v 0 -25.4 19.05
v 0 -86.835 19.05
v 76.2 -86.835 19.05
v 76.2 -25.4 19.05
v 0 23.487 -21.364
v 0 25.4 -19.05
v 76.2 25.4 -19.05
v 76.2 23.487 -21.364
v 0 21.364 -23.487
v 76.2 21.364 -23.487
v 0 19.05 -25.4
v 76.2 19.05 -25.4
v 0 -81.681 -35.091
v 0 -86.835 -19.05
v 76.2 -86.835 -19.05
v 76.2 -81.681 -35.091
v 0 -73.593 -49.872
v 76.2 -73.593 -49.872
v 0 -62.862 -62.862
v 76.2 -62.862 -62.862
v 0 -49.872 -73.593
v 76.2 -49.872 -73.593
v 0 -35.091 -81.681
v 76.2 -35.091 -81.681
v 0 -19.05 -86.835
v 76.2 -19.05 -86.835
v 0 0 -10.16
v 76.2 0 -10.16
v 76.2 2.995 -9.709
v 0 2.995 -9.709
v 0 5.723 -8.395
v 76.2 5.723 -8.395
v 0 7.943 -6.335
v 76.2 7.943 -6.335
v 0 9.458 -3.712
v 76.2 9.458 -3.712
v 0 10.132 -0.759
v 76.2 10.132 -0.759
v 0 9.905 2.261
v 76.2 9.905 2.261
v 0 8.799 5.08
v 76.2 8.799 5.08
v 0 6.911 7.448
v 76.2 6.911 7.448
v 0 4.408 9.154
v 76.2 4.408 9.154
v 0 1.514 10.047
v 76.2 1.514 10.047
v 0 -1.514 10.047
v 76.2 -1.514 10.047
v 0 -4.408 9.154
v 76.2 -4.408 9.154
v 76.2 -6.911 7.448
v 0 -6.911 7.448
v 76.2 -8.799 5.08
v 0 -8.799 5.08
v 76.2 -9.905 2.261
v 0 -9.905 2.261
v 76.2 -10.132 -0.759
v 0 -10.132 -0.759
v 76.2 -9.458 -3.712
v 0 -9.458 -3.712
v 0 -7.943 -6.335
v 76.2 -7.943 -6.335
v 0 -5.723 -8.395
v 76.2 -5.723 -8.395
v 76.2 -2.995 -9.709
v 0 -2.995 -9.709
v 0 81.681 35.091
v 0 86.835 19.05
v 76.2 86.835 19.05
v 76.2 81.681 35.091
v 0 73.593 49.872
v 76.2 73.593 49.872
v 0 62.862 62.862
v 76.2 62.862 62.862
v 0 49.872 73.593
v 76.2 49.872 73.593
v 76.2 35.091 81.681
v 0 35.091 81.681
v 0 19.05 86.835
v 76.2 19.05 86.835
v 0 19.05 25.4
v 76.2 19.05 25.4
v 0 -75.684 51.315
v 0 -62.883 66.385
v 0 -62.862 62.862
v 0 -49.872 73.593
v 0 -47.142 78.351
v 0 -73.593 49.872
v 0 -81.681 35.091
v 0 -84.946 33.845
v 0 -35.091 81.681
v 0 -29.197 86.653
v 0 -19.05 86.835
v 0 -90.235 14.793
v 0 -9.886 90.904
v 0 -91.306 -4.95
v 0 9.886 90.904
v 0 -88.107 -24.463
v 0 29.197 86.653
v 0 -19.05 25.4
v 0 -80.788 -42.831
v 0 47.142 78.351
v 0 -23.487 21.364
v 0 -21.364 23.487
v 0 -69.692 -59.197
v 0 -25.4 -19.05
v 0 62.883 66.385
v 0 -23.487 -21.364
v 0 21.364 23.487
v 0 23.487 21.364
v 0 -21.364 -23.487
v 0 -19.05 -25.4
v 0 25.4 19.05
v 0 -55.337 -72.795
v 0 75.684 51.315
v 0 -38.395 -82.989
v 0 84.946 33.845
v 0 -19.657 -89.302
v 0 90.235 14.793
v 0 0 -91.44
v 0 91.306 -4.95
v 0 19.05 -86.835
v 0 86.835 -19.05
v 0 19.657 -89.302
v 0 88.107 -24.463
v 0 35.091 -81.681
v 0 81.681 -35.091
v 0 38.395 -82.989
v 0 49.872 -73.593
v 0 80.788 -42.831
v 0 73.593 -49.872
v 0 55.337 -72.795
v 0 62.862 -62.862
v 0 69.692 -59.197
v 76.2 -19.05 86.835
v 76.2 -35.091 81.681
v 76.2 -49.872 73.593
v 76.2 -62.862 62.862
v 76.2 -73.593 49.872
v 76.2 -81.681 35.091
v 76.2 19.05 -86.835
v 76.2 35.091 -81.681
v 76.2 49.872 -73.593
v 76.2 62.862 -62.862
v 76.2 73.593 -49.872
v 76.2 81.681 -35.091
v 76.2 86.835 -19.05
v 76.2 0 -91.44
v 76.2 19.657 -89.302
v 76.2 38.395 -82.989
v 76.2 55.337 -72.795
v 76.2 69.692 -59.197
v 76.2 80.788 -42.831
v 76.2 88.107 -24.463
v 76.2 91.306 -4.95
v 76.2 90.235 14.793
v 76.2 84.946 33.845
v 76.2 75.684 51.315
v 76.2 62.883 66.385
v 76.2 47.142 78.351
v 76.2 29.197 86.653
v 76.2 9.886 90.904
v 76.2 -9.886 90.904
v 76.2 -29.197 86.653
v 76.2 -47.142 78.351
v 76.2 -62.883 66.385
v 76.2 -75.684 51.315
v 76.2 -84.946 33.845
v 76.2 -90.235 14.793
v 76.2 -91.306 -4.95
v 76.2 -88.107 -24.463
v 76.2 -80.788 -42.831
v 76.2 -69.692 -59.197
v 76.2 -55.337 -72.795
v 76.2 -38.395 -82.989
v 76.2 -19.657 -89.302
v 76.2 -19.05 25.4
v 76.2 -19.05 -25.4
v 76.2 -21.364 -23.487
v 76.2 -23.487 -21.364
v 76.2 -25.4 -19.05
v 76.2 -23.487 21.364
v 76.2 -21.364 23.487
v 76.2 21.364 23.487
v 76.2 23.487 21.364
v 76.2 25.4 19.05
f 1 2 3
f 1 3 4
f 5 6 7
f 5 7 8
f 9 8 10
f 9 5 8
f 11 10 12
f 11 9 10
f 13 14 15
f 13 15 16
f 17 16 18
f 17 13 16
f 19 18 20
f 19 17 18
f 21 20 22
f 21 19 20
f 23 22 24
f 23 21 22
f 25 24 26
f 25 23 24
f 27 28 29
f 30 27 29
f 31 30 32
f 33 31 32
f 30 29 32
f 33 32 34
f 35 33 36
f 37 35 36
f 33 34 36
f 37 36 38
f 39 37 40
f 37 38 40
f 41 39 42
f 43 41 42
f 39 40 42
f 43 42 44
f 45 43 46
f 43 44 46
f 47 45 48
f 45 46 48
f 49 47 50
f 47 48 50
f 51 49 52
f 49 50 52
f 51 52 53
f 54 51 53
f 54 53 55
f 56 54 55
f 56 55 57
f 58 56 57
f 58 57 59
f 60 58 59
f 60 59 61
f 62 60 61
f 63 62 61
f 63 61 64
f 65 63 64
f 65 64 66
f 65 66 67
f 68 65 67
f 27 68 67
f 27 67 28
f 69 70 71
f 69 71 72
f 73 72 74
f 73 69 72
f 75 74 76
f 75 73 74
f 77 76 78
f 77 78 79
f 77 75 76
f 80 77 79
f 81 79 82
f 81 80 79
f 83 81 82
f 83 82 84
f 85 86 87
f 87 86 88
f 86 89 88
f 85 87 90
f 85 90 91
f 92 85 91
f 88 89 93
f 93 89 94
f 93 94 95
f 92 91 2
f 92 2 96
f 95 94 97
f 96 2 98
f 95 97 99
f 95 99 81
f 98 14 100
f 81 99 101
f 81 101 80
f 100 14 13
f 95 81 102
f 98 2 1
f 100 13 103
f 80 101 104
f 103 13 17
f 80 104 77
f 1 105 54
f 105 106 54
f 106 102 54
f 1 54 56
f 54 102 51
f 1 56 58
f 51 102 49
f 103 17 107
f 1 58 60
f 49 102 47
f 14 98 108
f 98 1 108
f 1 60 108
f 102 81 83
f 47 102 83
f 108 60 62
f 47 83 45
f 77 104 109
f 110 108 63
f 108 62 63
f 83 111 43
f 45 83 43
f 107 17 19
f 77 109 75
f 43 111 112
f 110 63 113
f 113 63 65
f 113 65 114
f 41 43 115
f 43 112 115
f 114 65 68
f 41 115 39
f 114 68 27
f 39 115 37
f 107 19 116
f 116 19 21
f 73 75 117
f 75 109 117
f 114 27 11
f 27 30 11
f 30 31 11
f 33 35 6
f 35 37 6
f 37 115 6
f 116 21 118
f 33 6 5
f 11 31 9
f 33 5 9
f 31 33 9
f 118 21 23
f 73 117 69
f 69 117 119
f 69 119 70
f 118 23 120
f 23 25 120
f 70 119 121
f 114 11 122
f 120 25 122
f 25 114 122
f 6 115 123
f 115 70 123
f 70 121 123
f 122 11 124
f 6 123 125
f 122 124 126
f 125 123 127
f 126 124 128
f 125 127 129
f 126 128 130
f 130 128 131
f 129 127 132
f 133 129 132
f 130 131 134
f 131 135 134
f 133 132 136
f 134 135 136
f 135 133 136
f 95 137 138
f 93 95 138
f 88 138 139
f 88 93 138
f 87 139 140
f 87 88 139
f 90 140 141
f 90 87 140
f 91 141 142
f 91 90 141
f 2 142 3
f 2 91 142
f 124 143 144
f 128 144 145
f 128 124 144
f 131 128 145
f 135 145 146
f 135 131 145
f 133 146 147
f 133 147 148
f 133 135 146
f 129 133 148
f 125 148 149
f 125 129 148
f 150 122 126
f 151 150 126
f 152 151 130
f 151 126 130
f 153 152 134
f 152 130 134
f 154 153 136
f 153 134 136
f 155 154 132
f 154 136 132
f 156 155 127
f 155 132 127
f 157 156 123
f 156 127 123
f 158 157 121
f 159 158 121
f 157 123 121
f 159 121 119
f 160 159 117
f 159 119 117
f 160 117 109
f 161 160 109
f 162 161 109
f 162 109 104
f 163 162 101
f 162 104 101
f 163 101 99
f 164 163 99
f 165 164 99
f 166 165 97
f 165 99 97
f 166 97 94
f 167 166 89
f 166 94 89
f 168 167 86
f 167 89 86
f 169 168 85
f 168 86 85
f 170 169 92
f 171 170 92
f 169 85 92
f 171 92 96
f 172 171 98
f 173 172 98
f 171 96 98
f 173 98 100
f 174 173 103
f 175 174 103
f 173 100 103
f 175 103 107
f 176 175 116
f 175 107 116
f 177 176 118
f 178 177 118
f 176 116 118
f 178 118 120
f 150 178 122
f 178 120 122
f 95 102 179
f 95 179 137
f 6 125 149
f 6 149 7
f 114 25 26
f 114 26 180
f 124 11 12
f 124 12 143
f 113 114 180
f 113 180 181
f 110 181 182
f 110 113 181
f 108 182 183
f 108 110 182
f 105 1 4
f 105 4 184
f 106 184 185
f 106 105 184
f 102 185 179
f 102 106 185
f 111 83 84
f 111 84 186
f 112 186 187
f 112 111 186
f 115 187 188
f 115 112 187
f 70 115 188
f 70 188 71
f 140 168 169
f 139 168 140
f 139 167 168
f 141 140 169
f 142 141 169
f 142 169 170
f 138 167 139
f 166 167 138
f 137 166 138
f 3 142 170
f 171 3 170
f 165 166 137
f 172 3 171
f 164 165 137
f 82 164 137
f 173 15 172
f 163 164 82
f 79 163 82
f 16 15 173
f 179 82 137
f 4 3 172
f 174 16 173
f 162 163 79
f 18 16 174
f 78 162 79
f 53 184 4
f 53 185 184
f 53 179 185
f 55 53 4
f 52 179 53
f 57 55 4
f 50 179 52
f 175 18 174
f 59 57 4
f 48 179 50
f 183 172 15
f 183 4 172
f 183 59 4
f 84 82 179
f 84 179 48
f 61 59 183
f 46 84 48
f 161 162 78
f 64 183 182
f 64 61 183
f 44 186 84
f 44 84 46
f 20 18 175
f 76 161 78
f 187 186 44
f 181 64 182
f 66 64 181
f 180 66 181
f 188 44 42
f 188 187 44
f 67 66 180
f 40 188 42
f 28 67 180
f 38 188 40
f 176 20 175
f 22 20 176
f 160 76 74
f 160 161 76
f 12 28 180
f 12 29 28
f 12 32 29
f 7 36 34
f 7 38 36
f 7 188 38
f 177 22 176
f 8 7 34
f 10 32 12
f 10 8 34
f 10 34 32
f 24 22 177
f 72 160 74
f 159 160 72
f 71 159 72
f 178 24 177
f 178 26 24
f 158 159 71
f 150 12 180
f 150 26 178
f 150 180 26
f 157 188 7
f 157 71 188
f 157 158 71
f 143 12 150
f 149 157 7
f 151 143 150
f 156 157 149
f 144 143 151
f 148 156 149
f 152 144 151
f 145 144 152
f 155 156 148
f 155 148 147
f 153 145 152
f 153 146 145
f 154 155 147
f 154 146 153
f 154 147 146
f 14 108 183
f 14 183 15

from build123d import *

# Parameters (mm, degrees)
BOSS_EXTRUDE1_DEPTH = 76.2
BOSS_EXTRUDE2_START = -76.2
SKETCH2_R           = 91.44
SKETCH2_R_2         = 88.9
BOSS_EXTRUDE2_DEPTH = 76.2
SKETCH3_R           = 10.16
CUT_EXTRUDE1_DEPTH  = 88.9


with BuildPart() as part:
    # Sketch1 → Boss-Extrude1 (new body)
    with BuildSketch(Plane(origin=(0, 0, 0), x_dir=(0, 0, -1), z_dir=(1, 0, 0))):
        with BuildLine():
            Line((-86.834944003, 19.05), (-25.4, 19.05))
            ThreePointArc((-25.4, 19.05), (-22.450640303, 22.450640303), (-19.05, 25.4))
            Line((-19.05, 25.4), (-19.05, 86.834944003))
            ThreePointArc((-19.05, 86.834944003), (0, 88.9), (19.05, 86.834944003))
            Line((19.05, 86.834944003), (19.05, 25.4))
            ThreePointArc((19.05, 25.4), (22.450640303, 22.450640303), (25.4, 19.05))
            Line((25.4, 19.05), (86.834944003, 19.05))
            ThreePointArc((86.834944003, 19.05), (88.9, 0), (86.834944003, -19.05))
            Line((86.834944003, -19.05), (25.4, -19.05))
            ThreePointArc((25.4, -19.05), (22.450640303, -22.450640303), (19.05, -25.4))
            Line((19.05, -25.4), (19.05, -86.834944003))
            ThreePointArc((19.05, -86.834944003), (0, -88.9), (-19.05, -86.834944003))
            Line((-19.05, -86.834944003), (-19.05, -25.4))
            ThreePointArc((-19.05, -25.4), (-22.450640303, -22.450640303), (-25.4, -19.05))
            Line((-25.4, -19.05), (-86.834944003, -19.05))
            ThreePointArc((-86.834944003, -19.05), (-88.9, 0), (-86.834944003, 19.05))
        make_face()
    extrude(amount=BOSS_EXTRUDE1_DEPTH)

    # Sketch2 → Boss-Extrude2 (add)
    with BuildSketch(Plane(origin=(76.2, 0, 0), x_dir=(0, 0, -1), z_dir=(1, 0, 0)).offset(BOSS_EXTRUDE2_START)):
        Circle(SKETCH2_R)
        Circle(SKETCH2_R_2, mode=Mode.SUBTRACT)
    extrude(amount=BOSS_EXTRUDE2_DEPTH)

    # Sketch3 → Cut-Extrude1 (cut)
    with BuildSketch(Plane(origin=(76.2, 0, 0), x_dir=(0, 0, -1), z_dir=(1, 0, 0))):
        Circle(SKETCH3_R)
    extrude(amount=-CUT_EXTRUDE1_DEPTH, mode=Mode.SUBTRACT)


solid = part.part
